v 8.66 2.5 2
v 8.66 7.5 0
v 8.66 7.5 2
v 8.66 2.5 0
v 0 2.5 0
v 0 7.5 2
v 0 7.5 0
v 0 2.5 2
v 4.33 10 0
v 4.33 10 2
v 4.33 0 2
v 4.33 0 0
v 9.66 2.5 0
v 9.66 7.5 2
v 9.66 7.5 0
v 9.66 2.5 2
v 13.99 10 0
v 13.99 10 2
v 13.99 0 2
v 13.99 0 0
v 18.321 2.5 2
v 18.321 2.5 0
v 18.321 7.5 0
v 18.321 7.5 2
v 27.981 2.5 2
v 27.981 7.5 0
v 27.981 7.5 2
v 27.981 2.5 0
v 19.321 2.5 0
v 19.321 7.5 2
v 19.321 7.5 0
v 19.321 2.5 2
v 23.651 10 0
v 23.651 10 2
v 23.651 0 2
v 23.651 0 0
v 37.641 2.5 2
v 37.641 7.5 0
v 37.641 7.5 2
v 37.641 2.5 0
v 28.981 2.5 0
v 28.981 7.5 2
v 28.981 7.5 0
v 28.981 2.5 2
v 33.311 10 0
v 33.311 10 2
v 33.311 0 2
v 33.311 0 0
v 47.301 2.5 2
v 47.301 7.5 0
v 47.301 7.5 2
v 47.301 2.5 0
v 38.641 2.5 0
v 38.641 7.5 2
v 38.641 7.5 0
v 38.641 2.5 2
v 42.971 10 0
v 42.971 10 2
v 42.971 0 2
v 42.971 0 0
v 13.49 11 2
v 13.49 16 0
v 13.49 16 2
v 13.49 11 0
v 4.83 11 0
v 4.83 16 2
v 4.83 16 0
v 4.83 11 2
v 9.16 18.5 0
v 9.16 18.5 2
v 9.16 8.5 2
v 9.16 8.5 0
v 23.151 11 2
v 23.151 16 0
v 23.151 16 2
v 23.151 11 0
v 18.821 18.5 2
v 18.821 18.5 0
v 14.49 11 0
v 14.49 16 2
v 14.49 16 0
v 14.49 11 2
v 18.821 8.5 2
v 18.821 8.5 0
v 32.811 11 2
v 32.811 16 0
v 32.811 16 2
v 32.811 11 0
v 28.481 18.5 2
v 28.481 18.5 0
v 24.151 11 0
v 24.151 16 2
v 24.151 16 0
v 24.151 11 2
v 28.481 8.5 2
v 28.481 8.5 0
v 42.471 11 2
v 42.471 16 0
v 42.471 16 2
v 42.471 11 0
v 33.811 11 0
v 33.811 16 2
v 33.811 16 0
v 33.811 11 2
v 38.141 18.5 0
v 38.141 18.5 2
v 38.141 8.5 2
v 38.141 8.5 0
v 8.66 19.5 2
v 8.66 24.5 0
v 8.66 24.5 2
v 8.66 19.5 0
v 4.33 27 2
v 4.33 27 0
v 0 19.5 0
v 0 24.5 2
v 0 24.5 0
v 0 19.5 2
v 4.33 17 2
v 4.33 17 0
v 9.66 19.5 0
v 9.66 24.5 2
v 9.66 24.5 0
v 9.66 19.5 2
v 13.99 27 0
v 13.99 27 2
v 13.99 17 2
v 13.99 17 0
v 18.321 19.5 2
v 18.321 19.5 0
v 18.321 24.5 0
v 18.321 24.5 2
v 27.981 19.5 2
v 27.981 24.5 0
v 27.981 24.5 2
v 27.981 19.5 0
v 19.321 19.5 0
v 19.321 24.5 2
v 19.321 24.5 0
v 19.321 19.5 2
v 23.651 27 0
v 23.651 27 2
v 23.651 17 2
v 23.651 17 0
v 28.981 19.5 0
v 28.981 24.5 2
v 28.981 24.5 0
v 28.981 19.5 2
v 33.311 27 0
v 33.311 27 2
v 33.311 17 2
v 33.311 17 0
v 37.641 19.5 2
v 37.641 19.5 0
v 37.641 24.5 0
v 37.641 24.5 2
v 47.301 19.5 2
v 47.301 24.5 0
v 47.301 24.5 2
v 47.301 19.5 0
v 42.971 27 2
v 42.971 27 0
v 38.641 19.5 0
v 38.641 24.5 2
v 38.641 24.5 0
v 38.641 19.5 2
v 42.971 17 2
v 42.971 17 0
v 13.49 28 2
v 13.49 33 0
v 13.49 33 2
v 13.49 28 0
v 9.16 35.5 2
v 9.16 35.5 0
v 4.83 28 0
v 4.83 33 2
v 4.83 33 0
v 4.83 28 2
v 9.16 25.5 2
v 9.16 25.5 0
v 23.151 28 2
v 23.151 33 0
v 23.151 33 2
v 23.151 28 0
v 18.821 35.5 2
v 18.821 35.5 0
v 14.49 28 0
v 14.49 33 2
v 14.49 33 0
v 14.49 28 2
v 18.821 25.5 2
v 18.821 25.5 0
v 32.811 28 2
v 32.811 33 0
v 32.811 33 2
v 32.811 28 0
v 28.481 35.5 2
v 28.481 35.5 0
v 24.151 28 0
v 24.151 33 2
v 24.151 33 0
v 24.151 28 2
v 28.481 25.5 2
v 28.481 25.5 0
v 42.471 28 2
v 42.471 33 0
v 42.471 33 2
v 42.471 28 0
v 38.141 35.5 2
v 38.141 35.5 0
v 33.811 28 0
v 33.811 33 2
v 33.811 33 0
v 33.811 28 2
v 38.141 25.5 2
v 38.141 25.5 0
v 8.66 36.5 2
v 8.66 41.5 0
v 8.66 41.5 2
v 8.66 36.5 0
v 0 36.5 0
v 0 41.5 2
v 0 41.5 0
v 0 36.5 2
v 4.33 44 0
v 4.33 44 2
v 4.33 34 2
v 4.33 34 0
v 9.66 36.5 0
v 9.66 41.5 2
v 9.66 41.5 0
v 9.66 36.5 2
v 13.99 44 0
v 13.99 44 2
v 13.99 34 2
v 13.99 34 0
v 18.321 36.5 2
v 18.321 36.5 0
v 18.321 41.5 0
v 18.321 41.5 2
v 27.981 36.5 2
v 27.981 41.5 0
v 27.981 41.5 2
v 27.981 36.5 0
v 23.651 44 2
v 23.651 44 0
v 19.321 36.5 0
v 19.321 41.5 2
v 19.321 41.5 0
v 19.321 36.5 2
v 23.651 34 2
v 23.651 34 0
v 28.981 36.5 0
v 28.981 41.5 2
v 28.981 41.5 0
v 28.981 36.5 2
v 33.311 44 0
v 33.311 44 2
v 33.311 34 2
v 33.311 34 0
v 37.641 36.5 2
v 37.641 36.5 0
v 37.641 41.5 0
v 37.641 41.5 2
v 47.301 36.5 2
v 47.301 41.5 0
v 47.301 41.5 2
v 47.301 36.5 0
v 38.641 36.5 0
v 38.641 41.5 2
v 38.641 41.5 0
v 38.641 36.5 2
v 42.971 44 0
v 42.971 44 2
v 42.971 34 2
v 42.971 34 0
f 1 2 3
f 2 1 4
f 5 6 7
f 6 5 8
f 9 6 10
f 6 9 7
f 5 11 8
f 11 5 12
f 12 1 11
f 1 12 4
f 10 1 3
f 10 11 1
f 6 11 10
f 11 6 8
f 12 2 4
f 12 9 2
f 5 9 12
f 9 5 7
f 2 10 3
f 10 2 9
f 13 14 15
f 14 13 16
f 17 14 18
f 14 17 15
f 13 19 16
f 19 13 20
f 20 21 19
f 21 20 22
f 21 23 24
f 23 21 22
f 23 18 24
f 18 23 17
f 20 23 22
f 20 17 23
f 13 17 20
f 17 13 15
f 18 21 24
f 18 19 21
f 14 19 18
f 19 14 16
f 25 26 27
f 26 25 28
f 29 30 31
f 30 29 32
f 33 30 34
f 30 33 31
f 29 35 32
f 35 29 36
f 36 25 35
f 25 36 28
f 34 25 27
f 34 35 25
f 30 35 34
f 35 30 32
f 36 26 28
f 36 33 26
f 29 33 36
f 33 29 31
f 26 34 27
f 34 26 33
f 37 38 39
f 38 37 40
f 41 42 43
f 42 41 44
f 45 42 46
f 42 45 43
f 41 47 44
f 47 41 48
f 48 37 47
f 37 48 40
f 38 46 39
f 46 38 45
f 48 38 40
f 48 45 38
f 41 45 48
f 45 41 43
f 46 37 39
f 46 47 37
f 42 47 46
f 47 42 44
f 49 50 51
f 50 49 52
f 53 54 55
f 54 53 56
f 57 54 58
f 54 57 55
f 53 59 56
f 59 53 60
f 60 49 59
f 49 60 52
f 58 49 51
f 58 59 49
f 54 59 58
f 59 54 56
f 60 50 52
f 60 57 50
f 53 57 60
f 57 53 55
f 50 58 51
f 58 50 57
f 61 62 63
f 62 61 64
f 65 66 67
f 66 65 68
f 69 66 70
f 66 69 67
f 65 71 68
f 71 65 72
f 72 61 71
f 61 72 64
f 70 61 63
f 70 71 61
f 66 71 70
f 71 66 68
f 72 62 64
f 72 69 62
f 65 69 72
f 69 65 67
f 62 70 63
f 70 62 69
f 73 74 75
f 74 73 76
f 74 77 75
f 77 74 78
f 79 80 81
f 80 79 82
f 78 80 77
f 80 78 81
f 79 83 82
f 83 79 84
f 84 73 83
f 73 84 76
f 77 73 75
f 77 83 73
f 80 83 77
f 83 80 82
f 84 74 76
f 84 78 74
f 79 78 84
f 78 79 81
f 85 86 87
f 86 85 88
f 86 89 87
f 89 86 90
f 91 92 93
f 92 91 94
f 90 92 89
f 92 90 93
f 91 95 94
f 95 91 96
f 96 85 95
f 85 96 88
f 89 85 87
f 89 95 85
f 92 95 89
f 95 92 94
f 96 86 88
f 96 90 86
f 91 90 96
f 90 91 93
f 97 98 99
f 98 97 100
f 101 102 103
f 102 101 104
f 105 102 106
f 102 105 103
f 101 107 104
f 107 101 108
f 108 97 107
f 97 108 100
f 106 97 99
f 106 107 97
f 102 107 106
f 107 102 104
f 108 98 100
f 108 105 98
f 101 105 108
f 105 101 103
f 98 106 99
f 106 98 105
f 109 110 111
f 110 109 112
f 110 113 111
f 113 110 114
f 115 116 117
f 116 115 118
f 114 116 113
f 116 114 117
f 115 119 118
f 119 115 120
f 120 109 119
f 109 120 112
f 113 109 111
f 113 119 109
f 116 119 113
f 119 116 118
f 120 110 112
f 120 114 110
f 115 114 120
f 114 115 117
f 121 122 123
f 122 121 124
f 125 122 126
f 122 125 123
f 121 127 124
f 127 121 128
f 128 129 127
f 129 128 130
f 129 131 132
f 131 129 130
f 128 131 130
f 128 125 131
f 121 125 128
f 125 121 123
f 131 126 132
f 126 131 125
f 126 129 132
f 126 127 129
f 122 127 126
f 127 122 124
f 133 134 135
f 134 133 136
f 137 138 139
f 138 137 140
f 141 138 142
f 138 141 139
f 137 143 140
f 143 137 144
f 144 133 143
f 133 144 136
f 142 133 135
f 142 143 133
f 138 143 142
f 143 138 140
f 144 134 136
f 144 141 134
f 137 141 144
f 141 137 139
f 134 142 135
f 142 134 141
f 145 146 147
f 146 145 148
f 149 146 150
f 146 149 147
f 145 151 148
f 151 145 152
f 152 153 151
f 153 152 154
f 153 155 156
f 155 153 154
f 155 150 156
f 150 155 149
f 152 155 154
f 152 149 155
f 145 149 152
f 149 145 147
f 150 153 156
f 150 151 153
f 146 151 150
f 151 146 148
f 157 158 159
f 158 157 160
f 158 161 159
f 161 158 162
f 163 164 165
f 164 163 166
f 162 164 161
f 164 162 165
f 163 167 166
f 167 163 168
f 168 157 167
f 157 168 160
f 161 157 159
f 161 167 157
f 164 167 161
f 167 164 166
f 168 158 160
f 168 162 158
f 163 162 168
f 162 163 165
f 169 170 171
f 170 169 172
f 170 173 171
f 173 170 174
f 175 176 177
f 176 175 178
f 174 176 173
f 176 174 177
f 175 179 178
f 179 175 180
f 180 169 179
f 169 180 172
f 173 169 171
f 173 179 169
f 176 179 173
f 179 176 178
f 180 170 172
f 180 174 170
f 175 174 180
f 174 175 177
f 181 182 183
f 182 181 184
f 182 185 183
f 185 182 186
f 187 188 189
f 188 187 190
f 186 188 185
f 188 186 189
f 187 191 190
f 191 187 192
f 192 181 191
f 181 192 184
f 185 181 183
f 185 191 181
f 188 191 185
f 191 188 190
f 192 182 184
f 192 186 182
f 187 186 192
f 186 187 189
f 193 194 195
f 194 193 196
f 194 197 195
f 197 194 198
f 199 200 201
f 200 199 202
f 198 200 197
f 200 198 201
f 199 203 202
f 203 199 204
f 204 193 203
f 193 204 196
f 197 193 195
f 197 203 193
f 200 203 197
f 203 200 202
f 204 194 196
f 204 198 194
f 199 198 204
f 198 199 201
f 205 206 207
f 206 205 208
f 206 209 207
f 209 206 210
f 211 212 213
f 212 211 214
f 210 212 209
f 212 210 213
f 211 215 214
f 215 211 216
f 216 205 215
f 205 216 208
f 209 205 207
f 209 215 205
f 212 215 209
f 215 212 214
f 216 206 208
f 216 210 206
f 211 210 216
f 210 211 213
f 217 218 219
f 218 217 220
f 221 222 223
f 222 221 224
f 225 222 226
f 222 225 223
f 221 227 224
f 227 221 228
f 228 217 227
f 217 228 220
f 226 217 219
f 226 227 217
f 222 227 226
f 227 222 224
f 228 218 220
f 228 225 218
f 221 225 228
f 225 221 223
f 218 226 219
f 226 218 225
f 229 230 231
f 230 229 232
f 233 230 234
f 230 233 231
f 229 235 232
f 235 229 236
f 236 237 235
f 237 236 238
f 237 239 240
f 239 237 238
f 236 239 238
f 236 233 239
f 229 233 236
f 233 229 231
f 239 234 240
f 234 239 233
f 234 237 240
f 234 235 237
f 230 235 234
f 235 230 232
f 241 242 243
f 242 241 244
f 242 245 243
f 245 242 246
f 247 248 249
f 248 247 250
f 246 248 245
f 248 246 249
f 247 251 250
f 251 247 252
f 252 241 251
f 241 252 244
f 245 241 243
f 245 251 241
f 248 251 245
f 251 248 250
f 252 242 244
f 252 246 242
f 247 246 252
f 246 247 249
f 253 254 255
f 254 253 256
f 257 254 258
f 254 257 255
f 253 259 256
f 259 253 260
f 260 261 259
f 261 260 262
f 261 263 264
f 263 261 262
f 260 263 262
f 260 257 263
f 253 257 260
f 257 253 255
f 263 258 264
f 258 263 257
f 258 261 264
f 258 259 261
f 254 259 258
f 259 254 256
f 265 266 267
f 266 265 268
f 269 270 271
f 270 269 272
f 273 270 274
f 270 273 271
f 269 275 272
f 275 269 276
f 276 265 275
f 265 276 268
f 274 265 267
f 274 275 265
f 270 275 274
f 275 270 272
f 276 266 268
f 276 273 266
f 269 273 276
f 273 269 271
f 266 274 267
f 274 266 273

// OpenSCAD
calculateTriangleHeight = function (a) a * sqrt(3) / 2;

module hexShape (h, r) {
    translate(v = [calculateTriangleHeight(r),r,0]) 
    rotate([0,0,90])
    cylinder(h = h, r = r, $fn=6);
}

module hexGrid(rows, columns, radius, height, spacing) {
    triangleHeight = calculateTriangleHeight(radius);

    for (row = [0:rows-1]) {
        yOffset = (1.5 * radius + spacing) * row;
        rowXOffset = row % 2 == 0 ? 0 : (triangleHeight + 0.5 * spacing);

        columnsInRow = row % 2 == 0 ? columns : columns - 1;

        for (col = [0 : columnsInRow-1]) {
            xOffset = (2 * triangleHeight + spacing ) * col + rowXOffset;
            translate(v = [xOffset, yOffset, 0]) 
            hexShape(h=height, r=radius);
        }
    }
}

hexGrid(rows = 5, columns = 5, height = 2, radius = 5, spacing = 1);
